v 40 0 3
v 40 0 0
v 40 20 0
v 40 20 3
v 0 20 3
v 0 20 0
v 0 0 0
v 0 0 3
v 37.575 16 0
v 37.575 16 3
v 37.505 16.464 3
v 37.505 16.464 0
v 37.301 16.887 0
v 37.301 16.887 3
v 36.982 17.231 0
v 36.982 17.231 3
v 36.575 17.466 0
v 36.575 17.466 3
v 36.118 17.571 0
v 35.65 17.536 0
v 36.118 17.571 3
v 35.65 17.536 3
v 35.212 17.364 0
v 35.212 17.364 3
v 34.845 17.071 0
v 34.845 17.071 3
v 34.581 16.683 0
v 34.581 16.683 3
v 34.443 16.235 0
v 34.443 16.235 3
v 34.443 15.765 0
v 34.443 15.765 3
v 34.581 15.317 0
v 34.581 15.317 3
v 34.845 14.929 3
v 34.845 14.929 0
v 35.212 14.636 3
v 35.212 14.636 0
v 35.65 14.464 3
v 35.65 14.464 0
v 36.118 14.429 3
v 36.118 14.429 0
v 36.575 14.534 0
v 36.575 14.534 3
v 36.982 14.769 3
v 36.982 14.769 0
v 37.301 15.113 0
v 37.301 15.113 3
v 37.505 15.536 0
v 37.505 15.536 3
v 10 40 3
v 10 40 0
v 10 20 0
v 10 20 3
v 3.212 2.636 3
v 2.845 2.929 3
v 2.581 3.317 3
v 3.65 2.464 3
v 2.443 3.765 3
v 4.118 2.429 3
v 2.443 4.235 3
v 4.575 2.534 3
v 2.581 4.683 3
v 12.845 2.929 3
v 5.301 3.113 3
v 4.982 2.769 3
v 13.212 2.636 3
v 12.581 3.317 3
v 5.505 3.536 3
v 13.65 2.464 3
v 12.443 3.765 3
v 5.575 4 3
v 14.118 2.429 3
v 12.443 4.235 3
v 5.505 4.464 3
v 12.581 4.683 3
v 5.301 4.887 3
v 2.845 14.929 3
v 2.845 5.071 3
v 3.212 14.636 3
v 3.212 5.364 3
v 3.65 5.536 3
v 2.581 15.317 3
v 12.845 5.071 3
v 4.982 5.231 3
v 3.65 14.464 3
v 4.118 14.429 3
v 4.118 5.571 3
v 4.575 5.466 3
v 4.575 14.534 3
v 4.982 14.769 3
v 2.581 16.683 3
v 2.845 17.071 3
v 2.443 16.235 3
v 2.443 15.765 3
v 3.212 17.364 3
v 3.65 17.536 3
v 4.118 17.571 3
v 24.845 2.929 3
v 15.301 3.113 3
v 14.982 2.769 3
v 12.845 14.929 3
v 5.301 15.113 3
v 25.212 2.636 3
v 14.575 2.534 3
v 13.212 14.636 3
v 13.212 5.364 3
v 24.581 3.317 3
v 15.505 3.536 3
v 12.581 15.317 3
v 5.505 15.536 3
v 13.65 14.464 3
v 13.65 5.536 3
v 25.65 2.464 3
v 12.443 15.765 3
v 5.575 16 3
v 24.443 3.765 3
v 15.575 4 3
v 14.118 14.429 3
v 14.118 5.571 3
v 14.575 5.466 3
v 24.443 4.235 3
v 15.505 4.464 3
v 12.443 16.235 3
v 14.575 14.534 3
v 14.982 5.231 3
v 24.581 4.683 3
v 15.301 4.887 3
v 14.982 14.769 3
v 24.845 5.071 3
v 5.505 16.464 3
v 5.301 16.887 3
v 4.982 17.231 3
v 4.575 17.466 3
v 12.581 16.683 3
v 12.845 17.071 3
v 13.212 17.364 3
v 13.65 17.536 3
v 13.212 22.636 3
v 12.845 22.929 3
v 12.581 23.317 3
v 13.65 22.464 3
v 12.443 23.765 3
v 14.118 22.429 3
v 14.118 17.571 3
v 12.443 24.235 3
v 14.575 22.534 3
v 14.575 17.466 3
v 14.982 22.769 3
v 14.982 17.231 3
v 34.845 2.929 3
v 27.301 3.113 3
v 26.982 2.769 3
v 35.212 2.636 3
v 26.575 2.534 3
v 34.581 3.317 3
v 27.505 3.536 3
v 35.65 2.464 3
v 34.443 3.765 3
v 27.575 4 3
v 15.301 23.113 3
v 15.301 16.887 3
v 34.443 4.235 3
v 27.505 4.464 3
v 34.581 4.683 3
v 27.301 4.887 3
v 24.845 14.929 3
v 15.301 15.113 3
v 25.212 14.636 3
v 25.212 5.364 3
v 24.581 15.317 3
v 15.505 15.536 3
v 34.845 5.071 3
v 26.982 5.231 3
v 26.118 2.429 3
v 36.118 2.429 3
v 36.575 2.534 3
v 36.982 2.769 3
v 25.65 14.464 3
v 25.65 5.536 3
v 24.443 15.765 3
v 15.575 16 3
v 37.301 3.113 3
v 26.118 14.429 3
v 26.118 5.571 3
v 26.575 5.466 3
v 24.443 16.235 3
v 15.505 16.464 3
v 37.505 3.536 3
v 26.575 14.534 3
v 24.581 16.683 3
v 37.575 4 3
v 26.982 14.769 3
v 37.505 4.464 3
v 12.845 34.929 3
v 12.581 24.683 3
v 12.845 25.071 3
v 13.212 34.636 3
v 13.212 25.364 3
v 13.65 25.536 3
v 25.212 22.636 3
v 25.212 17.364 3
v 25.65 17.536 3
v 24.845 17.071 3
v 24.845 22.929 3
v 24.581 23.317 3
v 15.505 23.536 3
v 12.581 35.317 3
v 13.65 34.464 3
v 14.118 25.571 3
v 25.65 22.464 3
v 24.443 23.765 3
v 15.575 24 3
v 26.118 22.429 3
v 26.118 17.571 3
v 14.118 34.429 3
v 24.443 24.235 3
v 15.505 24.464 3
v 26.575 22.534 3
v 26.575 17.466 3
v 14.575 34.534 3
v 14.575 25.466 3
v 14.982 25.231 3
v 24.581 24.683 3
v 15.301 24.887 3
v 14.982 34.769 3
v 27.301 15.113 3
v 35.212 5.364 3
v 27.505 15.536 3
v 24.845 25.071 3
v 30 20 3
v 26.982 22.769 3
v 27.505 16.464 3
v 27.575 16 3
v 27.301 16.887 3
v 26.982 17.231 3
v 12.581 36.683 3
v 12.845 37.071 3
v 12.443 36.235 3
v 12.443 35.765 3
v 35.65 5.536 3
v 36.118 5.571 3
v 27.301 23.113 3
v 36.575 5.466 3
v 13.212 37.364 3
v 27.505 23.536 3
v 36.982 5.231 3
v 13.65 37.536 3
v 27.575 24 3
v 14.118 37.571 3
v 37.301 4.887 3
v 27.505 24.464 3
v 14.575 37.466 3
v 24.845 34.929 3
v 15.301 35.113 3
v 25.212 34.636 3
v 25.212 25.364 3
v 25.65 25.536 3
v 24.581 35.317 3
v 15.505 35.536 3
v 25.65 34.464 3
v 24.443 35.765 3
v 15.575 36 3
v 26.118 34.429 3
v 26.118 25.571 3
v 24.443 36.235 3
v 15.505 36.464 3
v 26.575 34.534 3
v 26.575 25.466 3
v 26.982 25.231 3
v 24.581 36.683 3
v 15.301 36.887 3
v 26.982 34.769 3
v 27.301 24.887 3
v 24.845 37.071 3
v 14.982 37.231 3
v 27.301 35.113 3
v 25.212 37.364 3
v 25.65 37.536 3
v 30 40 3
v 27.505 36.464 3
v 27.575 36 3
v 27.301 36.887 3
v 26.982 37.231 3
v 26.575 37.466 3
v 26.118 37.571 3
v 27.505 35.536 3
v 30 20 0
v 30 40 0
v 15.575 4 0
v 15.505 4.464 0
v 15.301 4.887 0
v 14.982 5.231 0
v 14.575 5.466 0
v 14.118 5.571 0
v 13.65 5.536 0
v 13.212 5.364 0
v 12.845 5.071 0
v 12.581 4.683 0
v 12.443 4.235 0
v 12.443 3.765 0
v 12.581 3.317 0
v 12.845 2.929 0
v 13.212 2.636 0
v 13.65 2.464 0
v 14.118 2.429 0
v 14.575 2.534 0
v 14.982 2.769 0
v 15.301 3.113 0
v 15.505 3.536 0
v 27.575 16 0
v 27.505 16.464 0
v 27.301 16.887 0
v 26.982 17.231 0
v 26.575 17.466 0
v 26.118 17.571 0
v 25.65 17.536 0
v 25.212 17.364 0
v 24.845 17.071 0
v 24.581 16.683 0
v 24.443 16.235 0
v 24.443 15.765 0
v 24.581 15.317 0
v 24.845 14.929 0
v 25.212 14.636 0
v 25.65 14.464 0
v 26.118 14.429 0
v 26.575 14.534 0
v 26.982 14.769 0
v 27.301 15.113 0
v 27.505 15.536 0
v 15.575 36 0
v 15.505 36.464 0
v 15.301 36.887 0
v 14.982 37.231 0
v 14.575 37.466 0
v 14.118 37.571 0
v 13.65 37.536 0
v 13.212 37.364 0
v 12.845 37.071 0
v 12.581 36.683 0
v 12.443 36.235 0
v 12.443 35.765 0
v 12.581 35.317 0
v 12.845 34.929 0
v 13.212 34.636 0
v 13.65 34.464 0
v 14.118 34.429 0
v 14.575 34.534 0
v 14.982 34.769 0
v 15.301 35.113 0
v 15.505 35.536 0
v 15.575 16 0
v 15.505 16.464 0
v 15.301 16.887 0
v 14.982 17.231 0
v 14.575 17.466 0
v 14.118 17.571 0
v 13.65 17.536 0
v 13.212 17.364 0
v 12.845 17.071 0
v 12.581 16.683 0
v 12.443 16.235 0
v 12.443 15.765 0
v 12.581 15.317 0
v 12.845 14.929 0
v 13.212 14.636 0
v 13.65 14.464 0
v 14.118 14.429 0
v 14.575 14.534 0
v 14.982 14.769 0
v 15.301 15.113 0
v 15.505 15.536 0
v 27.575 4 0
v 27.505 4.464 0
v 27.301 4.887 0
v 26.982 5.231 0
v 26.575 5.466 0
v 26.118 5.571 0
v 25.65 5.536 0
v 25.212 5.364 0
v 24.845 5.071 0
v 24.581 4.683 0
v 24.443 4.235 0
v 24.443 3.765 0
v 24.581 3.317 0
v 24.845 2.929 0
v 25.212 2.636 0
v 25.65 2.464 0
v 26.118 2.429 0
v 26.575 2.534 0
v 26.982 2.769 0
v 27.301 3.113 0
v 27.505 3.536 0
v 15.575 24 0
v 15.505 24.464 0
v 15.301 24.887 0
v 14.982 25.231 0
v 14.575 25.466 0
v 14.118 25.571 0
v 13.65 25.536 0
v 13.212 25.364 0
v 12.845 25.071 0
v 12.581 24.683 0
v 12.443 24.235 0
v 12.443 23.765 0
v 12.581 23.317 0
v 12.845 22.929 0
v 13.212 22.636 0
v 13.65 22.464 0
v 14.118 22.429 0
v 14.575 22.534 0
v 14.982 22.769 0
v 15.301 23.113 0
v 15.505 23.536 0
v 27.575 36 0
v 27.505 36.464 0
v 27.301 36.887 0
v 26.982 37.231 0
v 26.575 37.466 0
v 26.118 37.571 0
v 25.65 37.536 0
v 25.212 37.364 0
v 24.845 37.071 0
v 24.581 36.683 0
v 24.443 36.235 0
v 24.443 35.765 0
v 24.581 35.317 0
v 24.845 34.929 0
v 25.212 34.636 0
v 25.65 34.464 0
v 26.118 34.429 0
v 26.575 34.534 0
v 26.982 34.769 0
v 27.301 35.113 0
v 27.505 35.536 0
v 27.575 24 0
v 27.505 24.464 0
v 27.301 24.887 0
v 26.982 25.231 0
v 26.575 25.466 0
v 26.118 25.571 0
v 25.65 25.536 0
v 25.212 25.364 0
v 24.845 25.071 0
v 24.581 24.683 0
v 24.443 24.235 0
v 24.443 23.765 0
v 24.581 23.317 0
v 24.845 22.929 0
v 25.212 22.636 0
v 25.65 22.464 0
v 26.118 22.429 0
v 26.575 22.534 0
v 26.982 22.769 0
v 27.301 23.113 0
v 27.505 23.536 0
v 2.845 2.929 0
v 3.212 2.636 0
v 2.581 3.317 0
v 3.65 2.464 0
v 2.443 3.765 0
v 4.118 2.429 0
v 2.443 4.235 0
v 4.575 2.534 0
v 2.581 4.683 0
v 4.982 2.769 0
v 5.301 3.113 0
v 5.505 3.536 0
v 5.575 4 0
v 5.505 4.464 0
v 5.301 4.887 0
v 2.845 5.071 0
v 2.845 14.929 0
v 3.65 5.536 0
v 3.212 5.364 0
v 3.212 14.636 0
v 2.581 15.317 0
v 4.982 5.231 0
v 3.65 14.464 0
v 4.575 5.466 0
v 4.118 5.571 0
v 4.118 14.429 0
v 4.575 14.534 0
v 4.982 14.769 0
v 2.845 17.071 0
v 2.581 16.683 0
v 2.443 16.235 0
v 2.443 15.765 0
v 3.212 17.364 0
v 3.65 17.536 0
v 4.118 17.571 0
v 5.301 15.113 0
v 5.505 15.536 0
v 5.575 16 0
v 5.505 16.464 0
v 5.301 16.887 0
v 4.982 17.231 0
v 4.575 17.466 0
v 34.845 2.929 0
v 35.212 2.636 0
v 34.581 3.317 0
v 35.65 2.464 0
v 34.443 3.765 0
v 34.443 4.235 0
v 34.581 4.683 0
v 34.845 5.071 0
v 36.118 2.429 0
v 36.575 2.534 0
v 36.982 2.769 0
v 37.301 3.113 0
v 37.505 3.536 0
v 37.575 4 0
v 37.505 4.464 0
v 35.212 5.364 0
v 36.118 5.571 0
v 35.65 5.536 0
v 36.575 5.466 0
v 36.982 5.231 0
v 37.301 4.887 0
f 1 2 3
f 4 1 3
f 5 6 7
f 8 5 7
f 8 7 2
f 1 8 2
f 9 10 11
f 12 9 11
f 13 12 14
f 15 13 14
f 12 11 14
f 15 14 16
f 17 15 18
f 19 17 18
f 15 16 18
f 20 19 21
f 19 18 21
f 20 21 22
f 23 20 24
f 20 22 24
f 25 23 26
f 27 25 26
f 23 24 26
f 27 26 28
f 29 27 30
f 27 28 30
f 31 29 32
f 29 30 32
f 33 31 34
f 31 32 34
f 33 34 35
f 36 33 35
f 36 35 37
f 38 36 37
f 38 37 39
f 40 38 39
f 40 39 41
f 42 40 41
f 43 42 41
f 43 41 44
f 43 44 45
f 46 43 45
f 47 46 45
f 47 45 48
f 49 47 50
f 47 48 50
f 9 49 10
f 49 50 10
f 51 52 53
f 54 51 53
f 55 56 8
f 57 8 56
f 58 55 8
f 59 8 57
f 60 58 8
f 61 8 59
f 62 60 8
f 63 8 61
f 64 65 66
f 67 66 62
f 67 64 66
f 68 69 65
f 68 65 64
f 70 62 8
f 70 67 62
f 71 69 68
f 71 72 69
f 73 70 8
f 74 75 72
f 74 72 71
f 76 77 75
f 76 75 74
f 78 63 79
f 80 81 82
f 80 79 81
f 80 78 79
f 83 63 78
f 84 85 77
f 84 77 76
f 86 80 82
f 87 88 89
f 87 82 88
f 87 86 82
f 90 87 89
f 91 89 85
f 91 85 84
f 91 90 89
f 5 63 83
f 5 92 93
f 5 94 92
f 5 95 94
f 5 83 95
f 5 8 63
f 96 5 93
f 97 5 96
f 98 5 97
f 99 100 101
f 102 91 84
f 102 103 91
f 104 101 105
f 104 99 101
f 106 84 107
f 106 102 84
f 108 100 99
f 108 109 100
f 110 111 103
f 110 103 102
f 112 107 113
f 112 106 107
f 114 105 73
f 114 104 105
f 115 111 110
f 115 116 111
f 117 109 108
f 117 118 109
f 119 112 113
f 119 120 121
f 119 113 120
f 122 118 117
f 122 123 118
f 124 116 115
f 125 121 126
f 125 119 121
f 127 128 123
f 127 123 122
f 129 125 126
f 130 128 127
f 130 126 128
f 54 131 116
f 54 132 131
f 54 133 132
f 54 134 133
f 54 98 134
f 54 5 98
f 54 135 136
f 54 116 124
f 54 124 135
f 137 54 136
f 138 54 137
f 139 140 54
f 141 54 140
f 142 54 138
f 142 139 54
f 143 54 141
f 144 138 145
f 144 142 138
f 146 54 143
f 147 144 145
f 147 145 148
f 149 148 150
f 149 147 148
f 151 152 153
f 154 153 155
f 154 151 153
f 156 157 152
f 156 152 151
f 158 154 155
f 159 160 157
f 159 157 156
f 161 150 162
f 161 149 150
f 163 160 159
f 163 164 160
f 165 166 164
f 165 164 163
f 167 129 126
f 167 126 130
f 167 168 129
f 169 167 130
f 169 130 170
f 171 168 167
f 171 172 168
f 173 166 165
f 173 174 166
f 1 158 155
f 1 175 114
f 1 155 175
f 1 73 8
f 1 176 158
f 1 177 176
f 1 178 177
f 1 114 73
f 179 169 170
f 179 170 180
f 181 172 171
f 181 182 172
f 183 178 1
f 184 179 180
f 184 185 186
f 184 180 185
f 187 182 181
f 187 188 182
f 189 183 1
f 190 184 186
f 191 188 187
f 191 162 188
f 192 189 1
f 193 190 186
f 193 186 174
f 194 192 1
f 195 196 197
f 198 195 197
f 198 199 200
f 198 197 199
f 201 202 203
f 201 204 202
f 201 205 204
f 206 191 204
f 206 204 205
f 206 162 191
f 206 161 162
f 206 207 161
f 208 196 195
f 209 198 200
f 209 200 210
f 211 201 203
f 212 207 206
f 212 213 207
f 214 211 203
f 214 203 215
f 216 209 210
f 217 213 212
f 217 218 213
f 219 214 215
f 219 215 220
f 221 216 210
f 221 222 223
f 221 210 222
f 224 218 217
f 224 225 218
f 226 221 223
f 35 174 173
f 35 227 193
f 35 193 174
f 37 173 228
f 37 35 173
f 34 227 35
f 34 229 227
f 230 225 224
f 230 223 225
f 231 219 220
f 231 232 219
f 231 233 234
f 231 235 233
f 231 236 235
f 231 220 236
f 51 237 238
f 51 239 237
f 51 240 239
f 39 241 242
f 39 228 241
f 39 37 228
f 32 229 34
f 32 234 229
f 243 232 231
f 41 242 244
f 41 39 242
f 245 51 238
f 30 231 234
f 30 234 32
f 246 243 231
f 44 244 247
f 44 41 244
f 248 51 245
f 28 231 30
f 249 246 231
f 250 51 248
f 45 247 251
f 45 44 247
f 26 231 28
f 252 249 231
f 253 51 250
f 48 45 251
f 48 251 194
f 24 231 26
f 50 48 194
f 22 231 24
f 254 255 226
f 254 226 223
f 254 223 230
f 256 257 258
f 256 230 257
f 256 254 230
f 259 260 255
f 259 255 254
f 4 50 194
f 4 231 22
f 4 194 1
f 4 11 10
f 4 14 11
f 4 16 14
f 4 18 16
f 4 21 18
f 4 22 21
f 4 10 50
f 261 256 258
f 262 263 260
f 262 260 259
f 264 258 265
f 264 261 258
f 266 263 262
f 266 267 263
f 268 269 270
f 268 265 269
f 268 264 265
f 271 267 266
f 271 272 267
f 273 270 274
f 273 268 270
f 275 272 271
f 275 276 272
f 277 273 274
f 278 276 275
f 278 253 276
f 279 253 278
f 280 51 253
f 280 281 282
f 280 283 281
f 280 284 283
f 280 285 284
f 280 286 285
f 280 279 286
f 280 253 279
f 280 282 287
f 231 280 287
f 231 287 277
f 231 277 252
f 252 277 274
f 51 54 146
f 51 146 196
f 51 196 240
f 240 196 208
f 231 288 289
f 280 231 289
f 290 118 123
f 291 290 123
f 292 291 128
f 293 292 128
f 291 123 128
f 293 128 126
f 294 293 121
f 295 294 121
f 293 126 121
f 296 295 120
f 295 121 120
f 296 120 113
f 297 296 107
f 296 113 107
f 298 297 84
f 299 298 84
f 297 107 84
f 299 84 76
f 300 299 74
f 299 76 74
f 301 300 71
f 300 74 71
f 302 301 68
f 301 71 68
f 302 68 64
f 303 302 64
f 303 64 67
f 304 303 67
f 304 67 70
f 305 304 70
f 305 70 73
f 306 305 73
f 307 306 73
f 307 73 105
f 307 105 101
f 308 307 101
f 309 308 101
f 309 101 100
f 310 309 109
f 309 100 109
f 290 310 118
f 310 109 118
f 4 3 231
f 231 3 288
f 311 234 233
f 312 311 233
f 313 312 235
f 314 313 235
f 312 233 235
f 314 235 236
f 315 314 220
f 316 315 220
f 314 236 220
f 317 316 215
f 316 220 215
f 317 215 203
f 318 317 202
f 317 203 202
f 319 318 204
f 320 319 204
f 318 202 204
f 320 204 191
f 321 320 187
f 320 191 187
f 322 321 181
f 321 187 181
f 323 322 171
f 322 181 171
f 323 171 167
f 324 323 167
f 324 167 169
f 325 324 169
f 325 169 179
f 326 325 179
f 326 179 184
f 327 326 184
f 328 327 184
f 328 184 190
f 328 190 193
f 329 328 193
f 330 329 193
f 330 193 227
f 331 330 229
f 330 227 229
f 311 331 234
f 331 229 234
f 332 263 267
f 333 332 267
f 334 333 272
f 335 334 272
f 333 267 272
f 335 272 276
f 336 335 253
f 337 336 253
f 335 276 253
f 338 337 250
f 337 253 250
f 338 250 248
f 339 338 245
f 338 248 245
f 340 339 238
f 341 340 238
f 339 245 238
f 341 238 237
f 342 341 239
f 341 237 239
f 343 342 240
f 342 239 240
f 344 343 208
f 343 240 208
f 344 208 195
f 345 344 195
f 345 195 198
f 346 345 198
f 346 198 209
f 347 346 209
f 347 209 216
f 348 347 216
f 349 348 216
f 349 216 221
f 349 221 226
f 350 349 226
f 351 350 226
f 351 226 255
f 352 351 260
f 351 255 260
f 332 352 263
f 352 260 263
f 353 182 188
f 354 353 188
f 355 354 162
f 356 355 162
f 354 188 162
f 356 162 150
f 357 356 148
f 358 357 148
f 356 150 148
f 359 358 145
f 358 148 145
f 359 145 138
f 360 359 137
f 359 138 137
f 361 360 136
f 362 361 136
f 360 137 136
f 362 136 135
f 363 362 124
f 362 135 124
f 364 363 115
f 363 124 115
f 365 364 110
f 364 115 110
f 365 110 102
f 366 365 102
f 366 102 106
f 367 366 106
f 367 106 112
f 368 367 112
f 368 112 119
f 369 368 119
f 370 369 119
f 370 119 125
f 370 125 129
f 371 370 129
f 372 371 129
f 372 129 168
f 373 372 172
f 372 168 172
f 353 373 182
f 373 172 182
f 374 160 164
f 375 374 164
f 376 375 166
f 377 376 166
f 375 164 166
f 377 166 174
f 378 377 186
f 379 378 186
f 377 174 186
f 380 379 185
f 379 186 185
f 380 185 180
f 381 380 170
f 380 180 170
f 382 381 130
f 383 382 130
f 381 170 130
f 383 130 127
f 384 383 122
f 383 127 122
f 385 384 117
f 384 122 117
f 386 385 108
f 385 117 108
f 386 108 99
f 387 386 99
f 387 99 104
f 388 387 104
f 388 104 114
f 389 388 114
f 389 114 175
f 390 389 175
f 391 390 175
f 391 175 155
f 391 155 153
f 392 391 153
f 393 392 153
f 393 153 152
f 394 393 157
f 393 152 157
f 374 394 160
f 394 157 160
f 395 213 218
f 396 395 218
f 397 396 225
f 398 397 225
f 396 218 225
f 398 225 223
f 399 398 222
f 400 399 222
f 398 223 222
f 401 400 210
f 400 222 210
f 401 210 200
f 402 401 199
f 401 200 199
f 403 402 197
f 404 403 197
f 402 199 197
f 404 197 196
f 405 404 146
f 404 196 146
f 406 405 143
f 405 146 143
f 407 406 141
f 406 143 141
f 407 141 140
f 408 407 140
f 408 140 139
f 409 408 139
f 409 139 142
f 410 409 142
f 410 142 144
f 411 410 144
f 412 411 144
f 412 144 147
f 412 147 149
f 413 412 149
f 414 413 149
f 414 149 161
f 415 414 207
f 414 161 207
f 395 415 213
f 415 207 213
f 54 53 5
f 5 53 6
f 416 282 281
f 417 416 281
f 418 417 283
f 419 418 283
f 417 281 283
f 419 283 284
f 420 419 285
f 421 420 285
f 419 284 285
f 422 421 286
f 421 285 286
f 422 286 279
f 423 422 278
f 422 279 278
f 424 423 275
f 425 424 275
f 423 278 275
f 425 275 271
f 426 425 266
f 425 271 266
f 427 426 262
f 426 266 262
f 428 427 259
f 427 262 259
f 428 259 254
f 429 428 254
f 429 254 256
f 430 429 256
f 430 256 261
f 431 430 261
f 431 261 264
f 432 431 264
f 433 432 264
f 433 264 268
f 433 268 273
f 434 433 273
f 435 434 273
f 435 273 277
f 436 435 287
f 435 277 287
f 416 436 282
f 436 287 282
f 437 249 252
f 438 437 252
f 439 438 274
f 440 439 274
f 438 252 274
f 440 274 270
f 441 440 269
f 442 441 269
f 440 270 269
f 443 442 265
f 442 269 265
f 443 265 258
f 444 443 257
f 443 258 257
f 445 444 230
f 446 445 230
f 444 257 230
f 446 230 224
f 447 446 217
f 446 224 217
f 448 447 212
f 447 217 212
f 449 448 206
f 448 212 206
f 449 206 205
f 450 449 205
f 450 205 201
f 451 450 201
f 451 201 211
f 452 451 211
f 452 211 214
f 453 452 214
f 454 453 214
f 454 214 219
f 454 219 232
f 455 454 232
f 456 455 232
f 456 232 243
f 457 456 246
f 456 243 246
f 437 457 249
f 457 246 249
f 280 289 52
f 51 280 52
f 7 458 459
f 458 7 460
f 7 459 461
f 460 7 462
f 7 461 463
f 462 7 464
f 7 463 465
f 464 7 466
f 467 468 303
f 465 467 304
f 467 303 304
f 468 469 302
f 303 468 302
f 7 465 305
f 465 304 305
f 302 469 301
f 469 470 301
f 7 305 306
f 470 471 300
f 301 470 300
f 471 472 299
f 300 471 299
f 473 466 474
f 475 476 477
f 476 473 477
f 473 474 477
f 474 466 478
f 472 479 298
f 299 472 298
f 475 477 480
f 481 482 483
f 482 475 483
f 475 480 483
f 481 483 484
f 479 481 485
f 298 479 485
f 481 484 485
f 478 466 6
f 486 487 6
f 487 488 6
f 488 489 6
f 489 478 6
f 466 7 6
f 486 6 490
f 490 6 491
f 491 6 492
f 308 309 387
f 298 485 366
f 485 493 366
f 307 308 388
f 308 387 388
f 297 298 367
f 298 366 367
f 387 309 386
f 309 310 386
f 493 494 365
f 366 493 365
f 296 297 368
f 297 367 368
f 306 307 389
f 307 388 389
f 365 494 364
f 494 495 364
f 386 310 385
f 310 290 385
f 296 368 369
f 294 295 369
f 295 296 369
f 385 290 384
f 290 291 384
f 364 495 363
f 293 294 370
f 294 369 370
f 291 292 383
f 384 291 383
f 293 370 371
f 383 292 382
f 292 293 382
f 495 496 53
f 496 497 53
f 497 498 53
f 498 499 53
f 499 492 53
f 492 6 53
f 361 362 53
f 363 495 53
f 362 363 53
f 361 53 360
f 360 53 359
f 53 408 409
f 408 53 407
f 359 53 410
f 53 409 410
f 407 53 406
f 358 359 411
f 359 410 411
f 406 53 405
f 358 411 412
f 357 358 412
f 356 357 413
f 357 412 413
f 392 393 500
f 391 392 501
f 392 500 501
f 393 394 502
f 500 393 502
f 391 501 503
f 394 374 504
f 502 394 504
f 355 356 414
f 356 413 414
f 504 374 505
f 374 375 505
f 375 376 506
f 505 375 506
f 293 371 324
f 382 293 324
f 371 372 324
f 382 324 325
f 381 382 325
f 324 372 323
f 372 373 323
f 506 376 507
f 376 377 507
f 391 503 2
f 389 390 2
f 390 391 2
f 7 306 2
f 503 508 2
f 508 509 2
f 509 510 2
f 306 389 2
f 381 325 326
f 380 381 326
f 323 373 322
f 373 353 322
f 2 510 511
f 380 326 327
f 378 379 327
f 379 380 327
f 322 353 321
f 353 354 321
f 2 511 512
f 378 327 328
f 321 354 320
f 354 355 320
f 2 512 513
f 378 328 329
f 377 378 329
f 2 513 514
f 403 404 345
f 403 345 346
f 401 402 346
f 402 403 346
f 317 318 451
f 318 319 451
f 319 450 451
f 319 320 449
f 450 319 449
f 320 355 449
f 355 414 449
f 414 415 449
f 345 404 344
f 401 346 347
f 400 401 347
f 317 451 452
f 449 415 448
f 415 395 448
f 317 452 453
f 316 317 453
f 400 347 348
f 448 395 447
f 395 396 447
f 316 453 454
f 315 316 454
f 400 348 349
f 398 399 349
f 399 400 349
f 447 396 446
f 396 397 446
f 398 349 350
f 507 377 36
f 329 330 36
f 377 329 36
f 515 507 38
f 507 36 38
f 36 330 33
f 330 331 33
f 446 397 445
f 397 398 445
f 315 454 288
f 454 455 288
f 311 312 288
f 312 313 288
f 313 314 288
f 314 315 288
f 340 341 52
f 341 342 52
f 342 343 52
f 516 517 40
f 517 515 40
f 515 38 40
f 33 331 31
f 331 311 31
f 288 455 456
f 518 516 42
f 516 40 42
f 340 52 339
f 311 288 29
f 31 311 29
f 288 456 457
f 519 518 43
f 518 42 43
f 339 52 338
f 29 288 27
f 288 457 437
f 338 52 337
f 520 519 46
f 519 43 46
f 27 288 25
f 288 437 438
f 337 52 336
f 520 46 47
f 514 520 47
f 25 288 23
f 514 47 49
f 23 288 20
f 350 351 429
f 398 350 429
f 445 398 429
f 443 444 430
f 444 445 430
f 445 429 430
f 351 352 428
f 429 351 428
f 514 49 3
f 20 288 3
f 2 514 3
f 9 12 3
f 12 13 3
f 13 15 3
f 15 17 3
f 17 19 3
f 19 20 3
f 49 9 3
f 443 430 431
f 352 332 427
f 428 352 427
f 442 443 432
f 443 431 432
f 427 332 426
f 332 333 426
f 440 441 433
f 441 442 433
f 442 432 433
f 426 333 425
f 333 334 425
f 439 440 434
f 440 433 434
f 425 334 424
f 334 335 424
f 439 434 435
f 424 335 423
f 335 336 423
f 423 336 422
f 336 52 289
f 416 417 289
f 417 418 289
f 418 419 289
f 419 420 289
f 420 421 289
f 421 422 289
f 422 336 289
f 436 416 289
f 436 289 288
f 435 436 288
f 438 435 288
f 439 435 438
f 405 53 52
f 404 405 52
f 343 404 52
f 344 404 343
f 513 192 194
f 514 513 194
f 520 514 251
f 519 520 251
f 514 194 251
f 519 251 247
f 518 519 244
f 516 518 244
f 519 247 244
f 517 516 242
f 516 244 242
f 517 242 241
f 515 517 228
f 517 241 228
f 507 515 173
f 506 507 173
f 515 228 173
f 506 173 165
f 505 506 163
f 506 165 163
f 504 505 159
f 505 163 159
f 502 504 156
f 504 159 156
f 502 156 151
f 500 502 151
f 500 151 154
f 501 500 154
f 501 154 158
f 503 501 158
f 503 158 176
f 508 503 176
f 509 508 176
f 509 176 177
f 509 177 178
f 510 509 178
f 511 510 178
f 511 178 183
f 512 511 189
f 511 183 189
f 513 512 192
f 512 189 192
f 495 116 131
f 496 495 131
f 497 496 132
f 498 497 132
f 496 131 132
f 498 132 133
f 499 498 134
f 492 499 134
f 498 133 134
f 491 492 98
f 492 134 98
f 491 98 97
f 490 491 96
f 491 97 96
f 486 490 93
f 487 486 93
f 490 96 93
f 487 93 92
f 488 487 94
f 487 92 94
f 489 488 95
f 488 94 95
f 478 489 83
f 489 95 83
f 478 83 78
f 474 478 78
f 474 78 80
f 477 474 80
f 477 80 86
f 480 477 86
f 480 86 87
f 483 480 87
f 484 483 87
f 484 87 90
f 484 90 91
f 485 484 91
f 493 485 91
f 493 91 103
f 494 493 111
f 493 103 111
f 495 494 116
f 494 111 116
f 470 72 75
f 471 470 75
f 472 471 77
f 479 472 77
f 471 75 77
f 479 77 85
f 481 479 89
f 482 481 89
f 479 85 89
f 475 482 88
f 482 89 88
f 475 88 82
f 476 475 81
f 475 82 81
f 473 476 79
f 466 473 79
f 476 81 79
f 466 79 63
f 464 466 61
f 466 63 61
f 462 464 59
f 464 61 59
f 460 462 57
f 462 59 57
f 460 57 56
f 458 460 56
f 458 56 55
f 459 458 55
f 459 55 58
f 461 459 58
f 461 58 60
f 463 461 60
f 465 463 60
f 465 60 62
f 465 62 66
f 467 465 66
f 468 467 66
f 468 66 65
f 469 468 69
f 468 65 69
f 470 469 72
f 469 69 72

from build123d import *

# Parameters (mm, degrees)
EXTRUDE_1_DEPTH     = 3
SKETCH_2_R          = 1.575
CUT_EXTRUDE_1_DEPTH = 3


with BuildPart() as part:
    # 草图1 → 凸台-拉伸1 (new body)
    with BuildSketch(Plane.XY):
        Polygon((0, 0), (40, 0), (40, 20), (30, 20), (30, 40), (10, 40), (10, 20), (0, 20), align=None)
    extrude(amount=EXTRUDE_1_DEPTH)

    # 草图2 → 切除-拉伸1 (cut)
    with BuildSketch(Plane.XY.offset(3)):
        with Locations((14, 36)):
            Circle(SKETCH_2_R)
        with Locations((26, 36)):
            Circle(SKETCH_2_R)
        with Locations((26, 24)):
            Circle(SKETCH_2_R)
        with Locations((14, 24)):
            Circle(SKETCH_2_R)
        with Locations((4, 16)):
            Circle(SKETCH_2_R)
        with Locations((4, 4)):
            Circle(SKETCH_2_R)
        with Locations((14, 16)):
            Circle(SKETCH_2_R)
        with Locations((14, 4)):
            Circle(SKETCH_2_R)
        with Locations((36, 16)):
            Circle(SKETCH_2_R)
        with Locations((36, 4)):
            Circle(SKETCH_2_R)
        with Locations((26, 4)):
            Circle(SKETCH_2_R)
        with Locations((26, 16)):
            Circle(SKETCH_2_R)
    extrude(amount=-CUT_EXTRUDE_1_DEPTH, mode=Mode.SUBTRACT)


solid = part.part
